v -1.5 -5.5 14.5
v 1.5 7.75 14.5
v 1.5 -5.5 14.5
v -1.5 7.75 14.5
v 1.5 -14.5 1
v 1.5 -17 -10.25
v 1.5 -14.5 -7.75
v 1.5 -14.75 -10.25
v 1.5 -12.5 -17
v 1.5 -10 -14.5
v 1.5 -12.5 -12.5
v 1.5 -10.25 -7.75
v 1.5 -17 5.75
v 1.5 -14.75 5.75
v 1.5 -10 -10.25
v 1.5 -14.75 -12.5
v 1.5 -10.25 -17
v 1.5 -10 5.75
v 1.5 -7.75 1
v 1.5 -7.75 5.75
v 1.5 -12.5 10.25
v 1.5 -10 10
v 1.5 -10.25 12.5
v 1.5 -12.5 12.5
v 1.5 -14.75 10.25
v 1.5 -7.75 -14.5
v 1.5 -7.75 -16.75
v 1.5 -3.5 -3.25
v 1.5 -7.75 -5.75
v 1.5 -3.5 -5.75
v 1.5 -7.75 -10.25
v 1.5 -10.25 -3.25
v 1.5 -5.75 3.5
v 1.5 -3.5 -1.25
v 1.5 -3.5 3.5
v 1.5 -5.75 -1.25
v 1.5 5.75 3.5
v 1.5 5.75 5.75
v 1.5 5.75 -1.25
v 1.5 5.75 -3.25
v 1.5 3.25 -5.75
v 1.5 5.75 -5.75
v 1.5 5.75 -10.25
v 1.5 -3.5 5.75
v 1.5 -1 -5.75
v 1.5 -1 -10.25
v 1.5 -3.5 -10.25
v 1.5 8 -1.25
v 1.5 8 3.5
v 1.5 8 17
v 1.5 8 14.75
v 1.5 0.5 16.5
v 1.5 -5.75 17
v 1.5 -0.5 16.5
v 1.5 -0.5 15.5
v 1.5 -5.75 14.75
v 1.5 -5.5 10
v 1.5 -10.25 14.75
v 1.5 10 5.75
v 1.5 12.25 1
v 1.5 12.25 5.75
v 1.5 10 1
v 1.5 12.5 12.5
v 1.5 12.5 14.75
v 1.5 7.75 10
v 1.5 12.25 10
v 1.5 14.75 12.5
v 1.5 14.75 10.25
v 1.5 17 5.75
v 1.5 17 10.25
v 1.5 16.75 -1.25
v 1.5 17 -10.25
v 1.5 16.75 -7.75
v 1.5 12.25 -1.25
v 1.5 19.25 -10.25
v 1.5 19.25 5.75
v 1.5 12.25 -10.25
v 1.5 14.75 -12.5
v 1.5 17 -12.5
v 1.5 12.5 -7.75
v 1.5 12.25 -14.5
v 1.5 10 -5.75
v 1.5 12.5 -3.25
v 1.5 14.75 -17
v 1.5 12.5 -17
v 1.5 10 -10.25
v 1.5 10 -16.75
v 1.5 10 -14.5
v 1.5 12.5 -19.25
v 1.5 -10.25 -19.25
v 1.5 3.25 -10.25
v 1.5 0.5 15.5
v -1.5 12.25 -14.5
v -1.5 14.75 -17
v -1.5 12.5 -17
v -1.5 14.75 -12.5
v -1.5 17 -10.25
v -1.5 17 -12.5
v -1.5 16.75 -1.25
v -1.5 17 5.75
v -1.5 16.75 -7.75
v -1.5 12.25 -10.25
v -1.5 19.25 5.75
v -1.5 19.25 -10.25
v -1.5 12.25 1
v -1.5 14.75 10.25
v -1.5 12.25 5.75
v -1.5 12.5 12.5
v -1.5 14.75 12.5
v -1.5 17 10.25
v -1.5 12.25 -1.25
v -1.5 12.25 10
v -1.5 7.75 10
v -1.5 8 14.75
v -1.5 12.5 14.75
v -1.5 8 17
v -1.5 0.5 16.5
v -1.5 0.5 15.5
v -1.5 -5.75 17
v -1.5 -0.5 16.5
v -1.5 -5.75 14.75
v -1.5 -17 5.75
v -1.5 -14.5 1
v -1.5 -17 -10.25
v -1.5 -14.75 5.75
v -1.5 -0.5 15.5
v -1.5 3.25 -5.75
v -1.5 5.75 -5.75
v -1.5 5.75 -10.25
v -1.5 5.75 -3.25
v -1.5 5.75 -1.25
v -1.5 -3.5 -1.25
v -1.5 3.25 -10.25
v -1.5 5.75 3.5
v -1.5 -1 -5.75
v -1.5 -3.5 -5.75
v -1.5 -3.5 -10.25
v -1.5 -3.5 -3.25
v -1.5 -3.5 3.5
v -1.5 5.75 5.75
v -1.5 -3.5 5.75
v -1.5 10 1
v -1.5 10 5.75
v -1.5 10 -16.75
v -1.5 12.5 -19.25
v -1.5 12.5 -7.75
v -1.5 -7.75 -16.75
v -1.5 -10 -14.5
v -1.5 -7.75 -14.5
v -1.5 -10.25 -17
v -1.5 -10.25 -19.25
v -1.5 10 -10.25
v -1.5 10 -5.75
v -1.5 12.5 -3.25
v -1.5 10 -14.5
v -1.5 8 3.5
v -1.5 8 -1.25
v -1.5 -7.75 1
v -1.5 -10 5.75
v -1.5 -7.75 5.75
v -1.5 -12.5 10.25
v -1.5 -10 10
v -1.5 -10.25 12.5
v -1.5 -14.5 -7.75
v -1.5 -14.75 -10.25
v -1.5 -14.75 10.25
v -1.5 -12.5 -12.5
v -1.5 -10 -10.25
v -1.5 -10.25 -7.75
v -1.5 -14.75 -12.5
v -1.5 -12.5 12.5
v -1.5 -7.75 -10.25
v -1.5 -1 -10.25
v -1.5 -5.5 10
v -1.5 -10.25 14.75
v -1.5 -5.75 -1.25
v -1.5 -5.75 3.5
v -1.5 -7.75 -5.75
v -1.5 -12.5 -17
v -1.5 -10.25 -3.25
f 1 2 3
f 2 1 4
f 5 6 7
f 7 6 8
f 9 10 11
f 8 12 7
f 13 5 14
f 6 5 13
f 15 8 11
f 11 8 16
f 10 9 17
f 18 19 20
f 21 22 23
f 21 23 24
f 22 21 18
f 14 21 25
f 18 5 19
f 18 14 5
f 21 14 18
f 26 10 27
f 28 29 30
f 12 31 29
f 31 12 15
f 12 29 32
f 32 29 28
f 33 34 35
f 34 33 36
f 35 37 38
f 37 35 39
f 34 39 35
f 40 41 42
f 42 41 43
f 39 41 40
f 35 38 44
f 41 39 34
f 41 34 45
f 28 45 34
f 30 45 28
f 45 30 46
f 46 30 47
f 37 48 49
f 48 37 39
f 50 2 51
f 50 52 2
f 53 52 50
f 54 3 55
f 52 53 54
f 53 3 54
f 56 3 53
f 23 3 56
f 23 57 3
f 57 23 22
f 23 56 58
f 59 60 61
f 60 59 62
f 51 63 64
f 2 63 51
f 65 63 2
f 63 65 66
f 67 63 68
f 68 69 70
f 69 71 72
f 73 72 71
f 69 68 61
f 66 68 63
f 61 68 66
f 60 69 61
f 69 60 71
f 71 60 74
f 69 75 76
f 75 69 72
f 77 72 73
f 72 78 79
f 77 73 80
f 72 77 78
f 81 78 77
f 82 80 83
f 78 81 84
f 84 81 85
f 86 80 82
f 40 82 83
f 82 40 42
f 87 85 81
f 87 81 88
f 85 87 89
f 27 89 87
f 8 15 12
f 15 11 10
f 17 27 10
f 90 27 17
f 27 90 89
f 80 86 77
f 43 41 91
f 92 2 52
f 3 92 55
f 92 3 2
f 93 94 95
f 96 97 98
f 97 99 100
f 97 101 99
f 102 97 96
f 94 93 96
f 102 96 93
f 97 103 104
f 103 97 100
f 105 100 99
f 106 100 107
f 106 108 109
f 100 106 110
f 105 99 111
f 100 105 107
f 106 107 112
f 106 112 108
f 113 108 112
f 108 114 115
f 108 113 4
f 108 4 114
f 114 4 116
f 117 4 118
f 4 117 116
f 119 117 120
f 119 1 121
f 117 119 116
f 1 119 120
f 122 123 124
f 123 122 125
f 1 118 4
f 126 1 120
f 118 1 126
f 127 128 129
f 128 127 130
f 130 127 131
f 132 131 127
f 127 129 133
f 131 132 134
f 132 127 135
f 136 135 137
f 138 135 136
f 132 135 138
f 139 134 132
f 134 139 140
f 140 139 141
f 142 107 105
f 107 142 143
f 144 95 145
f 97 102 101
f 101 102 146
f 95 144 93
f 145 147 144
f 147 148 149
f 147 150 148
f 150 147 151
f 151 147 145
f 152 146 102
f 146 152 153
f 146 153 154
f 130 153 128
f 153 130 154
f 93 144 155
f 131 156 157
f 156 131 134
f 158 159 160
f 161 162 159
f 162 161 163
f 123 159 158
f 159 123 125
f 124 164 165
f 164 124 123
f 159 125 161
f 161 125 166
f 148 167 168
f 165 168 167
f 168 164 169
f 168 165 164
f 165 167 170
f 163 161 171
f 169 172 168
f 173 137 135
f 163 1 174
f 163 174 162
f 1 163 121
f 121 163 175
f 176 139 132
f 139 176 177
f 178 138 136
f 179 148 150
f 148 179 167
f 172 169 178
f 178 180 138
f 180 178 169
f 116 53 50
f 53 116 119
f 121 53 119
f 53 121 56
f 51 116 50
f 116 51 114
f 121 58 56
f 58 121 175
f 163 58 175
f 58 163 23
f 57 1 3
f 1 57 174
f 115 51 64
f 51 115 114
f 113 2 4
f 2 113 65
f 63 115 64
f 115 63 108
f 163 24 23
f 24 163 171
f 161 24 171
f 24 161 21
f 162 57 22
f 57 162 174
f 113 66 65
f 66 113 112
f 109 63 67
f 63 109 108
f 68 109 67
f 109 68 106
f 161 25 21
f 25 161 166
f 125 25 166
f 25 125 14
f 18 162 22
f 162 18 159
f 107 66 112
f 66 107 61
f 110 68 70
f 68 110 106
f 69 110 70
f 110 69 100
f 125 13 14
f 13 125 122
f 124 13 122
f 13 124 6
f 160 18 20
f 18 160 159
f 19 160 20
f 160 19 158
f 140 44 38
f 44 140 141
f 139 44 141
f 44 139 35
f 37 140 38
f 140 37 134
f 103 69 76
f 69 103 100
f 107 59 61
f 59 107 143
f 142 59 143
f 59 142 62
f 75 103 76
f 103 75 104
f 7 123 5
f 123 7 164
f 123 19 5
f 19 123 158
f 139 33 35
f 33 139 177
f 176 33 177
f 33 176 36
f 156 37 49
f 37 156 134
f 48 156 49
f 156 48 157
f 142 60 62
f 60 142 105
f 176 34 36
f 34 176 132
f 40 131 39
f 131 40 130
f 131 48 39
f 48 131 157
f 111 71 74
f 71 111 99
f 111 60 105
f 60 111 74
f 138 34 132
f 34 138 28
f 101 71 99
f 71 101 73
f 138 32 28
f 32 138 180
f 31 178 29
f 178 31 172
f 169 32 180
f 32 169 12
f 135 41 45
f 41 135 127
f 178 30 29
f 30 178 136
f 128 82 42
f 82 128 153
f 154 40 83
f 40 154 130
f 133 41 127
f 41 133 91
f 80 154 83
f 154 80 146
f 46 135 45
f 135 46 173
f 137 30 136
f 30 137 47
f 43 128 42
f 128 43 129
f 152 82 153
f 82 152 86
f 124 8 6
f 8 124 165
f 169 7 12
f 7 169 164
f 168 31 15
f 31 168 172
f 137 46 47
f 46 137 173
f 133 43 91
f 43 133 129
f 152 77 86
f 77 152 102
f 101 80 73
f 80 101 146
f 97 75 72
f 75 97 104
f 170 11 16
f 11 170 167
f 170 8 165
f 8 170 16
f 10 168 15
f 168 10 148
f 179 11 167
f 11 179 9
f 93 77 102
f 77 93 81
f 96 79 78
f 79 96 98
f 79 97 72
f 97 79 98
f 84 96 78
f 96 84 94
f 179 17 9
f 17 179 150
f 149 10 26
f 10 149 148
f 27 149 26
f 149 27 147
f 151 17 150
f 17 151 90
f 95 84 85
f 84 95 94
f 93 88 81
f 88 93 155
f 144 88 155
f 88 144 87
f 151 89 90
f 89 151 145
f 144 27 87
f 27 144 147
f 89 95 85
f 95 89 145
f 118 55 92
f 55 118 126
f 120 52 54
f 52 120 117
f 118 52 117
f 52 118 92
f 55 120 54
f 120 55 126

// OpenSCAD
shape = 6;//[0:Custom,1:SpaceShip,2:Alien1,3:SpaceInvader,4:Heart,5:Bow,6:Mushroom,7:Skull,8:WaitCursor,9:Pacman1,10:Pacman2,11:Potion,12:QuestionMark]

Custom = "[[0,0,0]]";

//Size of the pixel art object
objectSize = 50; 
//Thickness of the pixel art object
objectThickness = 3; 

gridRows = 2*10; //can't find a better to to get the customizer to ignore it 

//Pixel Width
unitWidth = objectSize / gridRows;

holeSize = 1; //resize hole if you set it to 0 there will be no hole
holeLocation = 0; //Change this to move the hole up or down (positive = down, negative = up)
unitLength = unitWidth;
distance = unitWidth;

//Shapes

SpaceShip1 = [[-5,-3,0],[-5,3,0],[-4,-2,0],[-4,2,0],[-3,-1,0],[-3,0,0],[-3,1,0],[-2,-2,0],[-2,-1,0],[-2,0,0],[-2,1,0],[-2,2,0],[-1,-3,0],[-1,-2,0],[-1,-1,0],[-1,0,0],[-1,1,0],[-1,2,0],[-1,3,0],[0,-5,0],[0,-4,0],[0,-3,0],[0,-1,0],[0,1,0],[0,3,0],[0,4,0],[0,5,0],[1,-3,0],[1,-2,0],[1,-1,0],[1,0,0],[1,1,0],[1,2,0],[1,3,0],[2,-2,0],[2,-1,0],[2,0,0],[2,1,0],[2,2,0],[3,-1,0],[3,0,0],[3,1,0],[4,-2,0],[4,2,0],[5,-3,0],[5,3,0]];

Alien1 =[[-6,-2,0],[-6,-1,0],[-6,0,0],[-6,1,0],[-6,2,0],[-5,-2,0],[-5,0,0],[-5,2,0],[-4,-2,0],[-4,-1,0],[-4,0,0],[-4,1,0],[-4,2,0],[-3,0,0],[-2,-3,0],[-2,-2,0],[-2,-1,0],[-2,0,0],[-2,1,0],[-2,2,0],[-2,3,0],[-1,-4,0],[-1,-3,0],[-1,-1,0],[-1,0,0],[-1,1,0],[-1,3,0],[-1,4,0],[0,-4,0],[0,-1,0],[0,0,0],[0,1,0],[0,4,0],[1,-5,0],[1,-4,0],[1,-1,0],[1,0,0],[1,1,0],[1,4,0],[1,5,0],[2,-5,0],[2,-1,0],[2,0,0],[2,1,0],[2,5,0],[3,-1,0],[3,0,0],[3,1,0],[4,-3,0],[4,-2,0],[4,-1,0],[4,0,0],[4,1,0],[4,2,0],[4,3,0],[5,-3,0],[5,3,0],[6,-3,0],[6,3,0],[7,-5,0],[7,-4,0],[7,-3,0],[7,3,0],[7,4,0],[7,5,0]];

Alien2 = [[-4,-4,0],[-4,4,0],[-3,-3,0],[-3,3,0],[-2,-4,0],[-2,-3,0],[-2,-2,0],[-2,-1,0],[-2,0,0],[-2,1,0],[-2,2,0],[-2,3,0],[-2,4,0],[-1,-4,0],[-1,-1,0],[-1,0,0],[-1,1,0],[-1,4,0],[0,-4,0],[0,-1,0],[0,0,0],[0,1,0],[0,4,0],[1,-5,0],[1,-4,0],[1,-1,0],[1,0,0],[1,1,0],[1,4,0],[1,5,0],[2,-6,0],[2,-5,0],[2,-4,0],[2,-3,0],[2,-2,0],[2,-1,0],[2,0,0],[2,1,0],[2,2,0],[2,3,0],[2,4,0],[2,5,0],[2,6,0],[3,-7,0],[3,-6,0],[3,-5,0],[3,-4,0],[3,-3,0],[3,-2,0],[3,-1,0],[3,0,0],[3,1,0],[3,2,0],[3,3,0],[3,4,0],[3,5,0],[3,6,0],[3,7,0],[4,-7,0],[4,-4,0],[4,-3,0],[4,-2,0],[4,-1,0],[4,0,0],[4,1,0],[4,2,0],[4,3,0],[4,4,0],[4,7,0],[5,-7,0],[5,-4,0],[5,4,0],[5,7,0],[6,-3,0],[6,3,0],[7,-2,0],[7,-1,0],[7,1,0],[7,2,0]];


Heart = [[-2,-4,0],[-2,-3,0],[-2,-2,0],[-2,2,0],[-2,3,0],[-2,4,0],[-1,-5,0],[-1,-4,0],[-1,-2,0],[-1,-1,0],[-1,1,0],[-1,2,0],[-1,3,0],[-1,4,0],[-1,5,0],[0,-5,0],[0,-3,0],[0,-2,0],[0,-1,0],[0,0,0],[0,1,0],[0,2,0],[0,3,0],[0,4,0],[0,5,0],[1,-5,0],[1,-3,0],[1,-2,0],[1,-1,0],[1,0,0],[1,1,0],[1,2,0],[1,3,0],[1,4,0],[1,5,0],[2,-5,0],[2,-4,0],[2,-3,0],[2,-2,0],[2,-1,0],[2,0,0],[2,1,0],[2,2,0],[2,3,0],[2,4,0],[2,5,0],[3,-4,0],[3,-3,0],[3,-2,0],[3,-1,0],[3,0,0],[3,1,0],[3,2,0],[3,3,0],[3,4,0],[4,-3,0],[4,-2,0],[4,-1,0],[4,0,0],[4,1,0],[4,2,0],[4,3,0],[5,-2,0],[5,-1,0],[5,0,0],[5,1,0],[5,2,0],[6,-1,0],[6,0,0],[6,1,0],[7,0,0]];

Mushroom1 = [[-9,-2,0],[-9,-1,0],[-9,0,0],[-9,1,0],[-9,2,0],[-9,3,0],[-8,-4,0],[-8,-3,0],[-8,-2,0],[-8,-1,0],[-8,2,0],[-8,3,0],[-8,4,0],[-8,5,0],[-7,-5,0],[-7,-4,0],[-7,-3,0],[-7,-2,0],[-7,-1,0],[-7,2,0],[-7,3,0],[-7,4,0],[-7,5,0],[-7,6,0],[-6,-6,0],[-6,-5,0],[-6,-3,0],[-6,-2,0],[-6,3,0],[-6,4,0],[-6,6,0],[-6,7,0],[-5,-6,0],[-5,7,0],[-4,-7,0],[-4,-6,0],[-4,-5,0],[-4,6,0],[-4,7,0],[-4,8,0],[-3,-7,0],[-3,-6,0],[-3,-5,0],[-3,-4,0],[-3,5,0],[-3,6,0],[-3,7,0],[-3,8,0],[-2,-7,0],[-2,-6,0],[-2,-5,0],[-2,-4,0],[-2,-1,0],[-2,0,0],[-2,1,0],[-2,2,0],[-2,5,0],[-2,6,0],[-2,7,0],[-2,8,0],[-1,-7,0],[-1,-6,0],[-1,-5,0],[-1,-1,0],[-1,0,0],[-1,1,0],[-1,2,0],[-1,6,0],[-1,7,0],[-1,8,0],[0,-7,0],[0,-6,0],[0,-5,0],[0,-2,0],[0,-1,0],[0,0,0],[0,1,0],[0,2,0],[0,3,0],[0,6,0],[0,7,0],[0,8,0],[1,-7,0],[1,-1,0],[1,0,0],[1,1,0],[1,2,0],[1,8,0],[2,-7,0],[2,-4,0],[2,-3,0],[2,-2,0],[2,-1,0],[2,0,0],[2,1,0],[2,2,0],[2,3,0],[2,4,0],[2,5,0],[2,8,0],[3,-7,0],[3,-4,0],[3,-1,0],[3,2,0],[3,5,0],[3,8,0],[4,-7,0],[4,-6,0],[4,-5,0],[4,-1,0],[4,2,0],[4,6,0],[4,7,0],[4,8,0],[5,-6,0],[5,-5,0],[5,6,0],[5,7,0],[6,-5,0],[6,6,0],[7,-5,0],[7,-4,0],[7,5,0],[7,6,0],[8,-4,0],[8,-3,0],[8,-2,0],[8,-1,0],[8,0,0],[8,1,0],[8,2,0],[8,3,0],[8,4,0],[8,5,0]];;

Mushroom2 = [[-7,-2,0],[-7,-1,0],[-7,0,0],[-7,1,0],[-7,2,0],[-7,3,0],[-6,-4,0],[-6,-3,0],[-6,4,0],[-6,5,0],[-5,-5,0],[-5,-4,0],[-5,-3,0],[-5,4,0],[-5,5,0],[-5,6,0],[-4,-6,0],[-4,-5,0],[-4,6,0],[-4,7,0],[-3,-6,0],[-3,-5,0],[-3,6,0],[-3,7,0],[-2,-7,0],[-2,-6,0],[-2,-5,0],[-2,-4,0],[-2,-1,0],[-2,0,0],[-2,1,0],[-2,2,0],[-2,5,0],[-2,6,0],[-2,7,0],[-2,8,0],[-1,-7,0],[-1,-6,0],[-1,-5,0],[-1,-4,0],[-1,-2,0],[-1,-1,0],[-1,0,0],[-1,1,0],[-1,2,0],[-1,3,0],[-1,5,0],[-1,6,0],[-1,7,0],[-1,8,0],[0,-7,0],[0,-2,0],[0,-1,0],[0,0,0],[0,1,0],[0,2,0],[0,3,0],[0,6,0],[0,7,0],[0,8,0],[1,-7,0],[1,-1,0],[1,0,0],[1,1,0],[1,2,0],[1,8,0],[2,-7,0],[2,-4,0],[2,-3,0],[2,-2,0],[2,-1,0],[2,0,0],[2,1,0],[2,2,0],[2,3,0],[2,4,0],[2,5,0],[2,8,0],[3,-7,0],[3,-4,0],[3,-1,0],[3,2,0],[3,5,0],[3,8,0],[4,-7,0],[4,-6,0],[4,-5,0],[4,-4,0],[4,-1,0],[4,2,0],[4,5,0],[4,6,0],[4,7,0],[4,8,0],[5,-6,0],[5,-5,0],[5,6,0],[5,7,0],[6,-5,0],[6,6,0],[7,-5,0],[7,-4,0],[7,5,0],[7,6,0],[8,-4,0],[8,-3,0],[8,-2,0],[8,-1,0],[8,0,0],[8,1,0],[8,2,0],[8,3,0],[8,4,0],[8,5,0]];


Skull1=[[-4,-3,0],[-4,-2,0],[-4,-1,0],[-4,0,0],[-4,1,0],[-4,2,0],[-4,3,0],[-3,-4,0],[-3,-3,0],[-3,-2,0],[-3,-1,0],[-3,0,0],[-3,1,0],[-3,2,0],[-3,3,0],[-3,4,0],[-2,-5,0],[-2,-4,0],[-2,-3,0],[-2,-2,0],[-2,-1,0],[-2,0,0],[-2,1,0],[-2,2,0],[-2,3,0],[-2,4,0],[-2,5,0],[-1,-5,0],[-1,-4,0],[-1,0,0],[-1,4,0],[-1,5,0],[0,-5,0],[0,-4,0],[0,0,0],[0,4,0],[0,5,0],[1,-5,0],[1,-4,0],[1,0,0],[1,4,0],[1,5,0],[2,-5,0],[2,-4,0],[2,-3,0],[2,-2,0],[2,-1,0],[2,0,0],[2,1,0],[2,2,0],[2,3,0],[2,4,0],[2,5,0],[3,-4,0],[3,-3,0],[3,-1,0],[3,1,0],[3,3,0],[3,4,0],[4,-3,0],[4,-1,0],[4,1,0],[4,3,0],[5,-3,0],[5,-1,0],[5,1,0],[5,3,0],[6,-3,0],[6,-1,0],[6,1,0],[6,3,0],[7,-3,0],[7,-2,0],[7,-1,0],[7,0,0],[7,1,0],[7,2,0],[7,3,0]];


Wait1= [[-10,-5,0],[-10,-4,0],[-10,-3,0],[-10,-2,0],[-10,-1,0],[-10,0,0],[-10,1,0],[-10,2,0],[-10,3,0],[-10,4,0],[-10,5,0],[-9,-5,0],[-9,5,0],[-8,-5,0],[-8,-4,0],[-8,-3,0],[-8,-2,0],[-8,-1,0],[-8,0,0],[-8,1,0],[-8,2,0],[-8,3,0],[-8,4,0],[-8,5,0],[-7,-4,0],[-7,4,0],[-6,-4,0],[-6,-2,0],[-6,0,0],[-6,2,0],[-6,4,0],[-5,-4,0],[-5,-1,0],[-5,1,0],[-5,4,0],[-4,-4,0],[-4,0,0],[-4,4,0],[-3,-4,0],[-3,4,0],[-2,-3,0],[-2,-2,0],[-2,0,0],[-2,2,0],[-2,3,0],[-1,-2,0],[-1,-1,0],[-1,1,0],[-1,2,0],[0,-1,0],[0,1,0],[1,-2,0],[1,-1,0],[1,1,0],[1,2,0],[2,-3,0],[2,-2,0],[2,0,0],[2,2,0],[2,3,0],[3,-4,0],[3,4,0],[4,-4,0],[4,0,0],[4,4,0],[5,-4,0],[5,-1,0],[5,1,0],[5,4,0],[6,-4,0],[6,-2,0],[6,0,0],[6,2,0],[6,4,0],[7,-5,0],[7,-4,0],[7,-3,0],[7,-2,0],[7,-1,0],[7,0,0],[7,1,0],[7,2,0],[7,3,0],[7,4,0],[7,5,0],[8,-5,0],[8,5,0],[9,-5,0],[9,-4,0],[9,-3,0],[9,-2,0],[9,-1,0],[9,0,0],[9,1,0],[9,2,0],[9,3,0],[9,4,0],[9,5,0]];

Pacman1 =[[-6,-2,0],[-6,-1,0],[-6,0,0],[-6,1,0],[-6,2,0],[-5,-4,0],[-5,-3,0],[-5,-2,0],[-5,-1,0],[-5,0,0],[-5,1,0],[-5,2,0],[-5,3,0],[-5,4,0],[-4,-5,0],[-4,-4,0],[-4,-3,0],[-4,-2,0],[-4,-1,0],[-4,0,0],[-4,1,0],[-4,2,0],[-4,3,0],[-4,4,0],[-4,5,0],[-3,-5,0],[-3,-4,0],[-3,-3,0],[-3,-2,0],[-3,-1,0],[-3,0,0],[-3,1,0],[-3,2,0],[-3,3,0],[-3,4,0],[-3,5,0],[-2,-6,0],[-2,-5,0],[-2,-4,0],[-2,-3,0],[-2,-2,0],[-2,-1,0],[-2,0,0],[-2,1,0],[-2,2,0],[-2,3,0],[-1,-6,0],[-1,-5,0],[-1,-4,0],[-1,-3,0],[-1,-2,0],[-1,-1,0],[-1,0,0],[0,-6,0],[0,-5,0],[0,-4,0],[0,-3,0],[0,-2,0],[1,-6,0],[1,-5,0],[1,-4,0],[1,-3,0],[1,-2,0],[1,-1,0],[1,0,0],[2,-6,0],[2,-5,0],[2,-4,0],[2,-3,0],[2,-2,0],[2,-1,0],[2,0,0],[2,1,0],[2,2,0],[2,3,0],[3,-5,0],[3,-4,0],[3,-3,0],[3,-2,0],[3,-1,0],[3,0,0],[3,1,0],[3,2,0],[3,3,0],[3,4,0],[3,5,0],[4,-5,0],[4,-4,0],[4,-3,0],[4,-2,0],[4,-1,0],[4,0,0],[4,1,0],[4,2,0],[4,3,0],[4,4,0],[4,5,0],[5,-4,0],[5,-3,0],[5,-2,0],[5,-1,0],[5,0,0],[5,1,0],[5,2,0],[5,3,0],[5,4,0],[6,-2,0],[6,-1,0],[6,0,0],[6,1,0],[6,2,0]];

Pacman2 = [[-10,-3,0],[-10,-2,0],[-10,-1,0],[-10,0,0],[-10,1,0],[-10,2,0],[-10,3,0],[-9,-6,0],[-9,-5,0],[-9,-4,0],[-9,-3,0],[-9,-2,0],[-9,-1,0],[-9,0,0],[-9,1,0],[-9,2,0],[-9,3,0],[-9,4,0],[-9,5,0],[-9,6,0],[-8,-6,0],[-8,-5,0],[-8,-4,0],[-8,-3,0],[-8,-2,0],[-8,-1,0],[-8,0,0],[-8,1,0],[-8,2,0],[-8,3,0],[-8,4,0],[-8,5,0],[-8,6,0],[-7,-7,0],[-7,-6,0],[-7,-5,0],[-7,-4,0],[-7,-3,0],[-7,-2,0],[-7,-1,0],[-7,0,0],[-7,1,0],[-7,2,0],[-7,3,0],[-7,4,0],[-7,5,0],[-7,6,0],[-7,7,0],[-6,-8,0],[-6,-7,0],[-6,-6,0],[-6,-5,0],[-6,-4,0],[-6,-3,0],[-6,-2,0],[-6,-1,0],[-6,0,0],[-6,1,0],[-6,2,0],[-6,3,0],[-6,4,0],[-6,5,0],[-6,6,0],[-6,7,0],[-6,8,0],[-5,-8,0],[-5,-7,0],[-5,-6,0],[-5,-5,0],[-5,-4,0],[-5,-3,0],[-5,-2,0],[-5,-1,0],[-5,0,0],[-5,1,0],[-5,2,0],[-5,3,0],[-5,4,0],[-5,5,0],[-5,6,0],[-5,7,0],[-5,8,0],[-4,-8,0],[-4,-7,0],[-4,-6,0],[-4,-2,0],[-4,-1,0],[-4,0,0],[-4,1,0],[-4,2,0],[-4,6,0],[-4,7,0],[-4,8,0],[-3,-9,0],[-3,-8,0],[-3,-7,0],[-3,-1,0],[-3,0,0],[-3,1,0],[-3,7,0],[-3,8,0],[-2,-9,0],[-2,-8,0],[-2,-7,0],[-2,-1,0],[-2,0,0],[-2,1,0],[-2,7,0],[-2,8,0],[-2,9,0],[-1,-9,0],[-1,-8,0],[-1,-7,0],[-1,-5,0],[-1,-4,0],[-1,-3,0],[-1,-1,0],[-1,0,0],[-1,1,0],[-1,3,0],[-1,4,0],[-1,5,0],[-1,7,0],[-1,8,0],[-1,9,0],[0,-9,0],[0,-8,0],[0,-7,0],[0,-5,0],[0,-4,0],[0,-3,0],[0,-1,0],[0,0,0],[0,1,0],[0,3,0],[0,4,0],[0,5,0],[0,7,0],[0,8,0],[0,9,0],[1,-9,0],[1,-8,0],[1,-7,0],[1,-5,0],[1,-4,0],[1,-3,0],[1,-1,0],[1,0,0],[1,1,0],[1,3,0],[1,4,0],[1,5,0],[1,7,0],[1,8,0],[1,9,0],[2,-9,0],[2,-8,0],[2,-7,0],[2,-6,0],[2,-5,0],[2,-4,0],[2,-3,0],[2,-2,0],[2,-1,0],[2,0,0],[2,1,0],[2,2,0],[2,3,0],[2,4,0],[2,5,0],[2,6,0],[2,7,0],[2,8,0],[2,9,0],[3,-9,0],[3,-8,0],[3,-7,0],[3,-6,0],[3,-5,0],[3,-4,0],[3,-3,0],[3,-2,0],[3,-1,0],[3,0,0],[3,1,0],[3,2,0],[3,3,0],[3,4,0],[3,5,0],[3,6,0],[3,7,0],[3,8,0],[3,9,0],[4,-9,0],[4,-8,0],[4,-7,0],[4,-6,0],[4,-5,0],[4,-4,0],[4,-3,0],[4,-2,0],[4,-1,0],[4,0,0],[4,1,0],[4,2,0],[4,3,0],[4,4,0],[4,5,0],[4,6,0],[4,7,0],[4,8,0],[4,9,0],[5,-9,0],[5,-8,0],[5,-7,0],[5,-6,0],[5,-5,0],[5,-4,0],[5,-3,0],[5,-2,0],[5,-1,0],[5,0,0],[5,1,0],[5,2,0],[5,3,0],[5,4,0],[5,5,0],[5,6,0],[5,7,0],[5,8,0],[5,9,0],[6,-9,0],[6,-8,0],[6,-7,0],[6,-6,0],[6,-5,0],[6,-4,0],[6,-3,0],[6,-2,0],[6,-1,0],[6,0,0],[6,1,0],[6,2,0],[6,3,0],[6,4,0],[6,5,0],[6,6,0],[6,7,0],[6,8,0],[6,9,0],[7,-9,0],[7,-8,0],[7,-7,0],[7,-6,0],[7,-5,0],[7,-4,0],[7,-3,0],[7,-2,0],[7,-1,0],[7,0,0],[7,1,0],[7,2,0],[7,3,0],[7,4,0],[7,5,0],[7,6,0],[7,7,0],[7,8,0],[7,9,0],[8,-9,0],[8,-8,0],[8,-7,0],[8,-6,0],[8,-5,0],[8,-2,0],[8,-1,0],[8,0,0],[8,1,0],[8,2,0],[8,5,0],[8,6,0],[8,7,0],[8,8,0],[8,9,0],[9,-8,0],[9,-7,0],[9,-6,0],[9,0,0],[9,6,0],[9,7,0],[9,8,0]];

Bow1 = [[-5,-7,0],[-5,-6,0],[-5,6,0],[-5,7,0],[-4,-8,0],[-4,-5,0],[-4,-4,0],[-4,4,0],[-4,5,0],[-4,8,0],[-3,-8,0],[-3,-3,0],[-3,3,0],[-3,8,0],[-2,-9,0],[-2,-2,0],[-2,-1,0],[-2,0,0],[-2,1,0],[-2,2,0],[-2,9,0],[-1,-9,0],[-1,-4,0],[-1,-2,0],[-1,-1,0],[-1,0,0],[-1,1,0],[-1,2,0],[-1,4,0],[-1,9,0],[0,-9,0],[0,-3,0],[0,-2,0],[0,-1,0],[0,0,0],[0,1,0],[0,2,0],[0,3,0],[0,9,0],[1,-9,0],[1,-4,0],[1,-2,0],[1,-1,0],[1,0,0],[1,1,0],[1,2,0],[1,4,0],[1,9,0],[2,-9,0],[2,-2,0],[2,-1,0],[2,0,0],[2,1,0],[2,2,0],[2,9,0],[3,-8,0],[3,-3,0],[3,3,0],[3,8,0],[4,-8,0],[4,-5,0],[4,-4,0],[4,4,0],[4,5,0],[4,8,0],[5,-7,0],[5,-6,0],[5,6,0],[5,7,0]];;

Potion = [[-10,-3,0],[-10,-2,0],[-10,-1,0],[-10,0,0],[-10,1,0],[-10,2,0],[-10,3,0],[-9,-3,0],[-9,3,0],[-8,-2,0],[-8,2,0],[-7,-2,0],[-7,2,0],[-6,-2,0],[-6,2,0],[-5,-3,0],[-5,3,0],[-4,-3,0],[-4,2,0],[-4,3,0],[-3,-4,0],[-3,-2,0],[-3,3,0],[-3,4,0],[-2,-4,0],[-2,1,0],[-2,4,0],[-1,-5,0],[-1,2,0],[-1,3,0],[-1,4,0],[-1,5,0],[0,-5,0],[0,-1,0],[0,0,0],[0,1,0],[0,2,0],[0,3,0],[0,4,0],[0,5,0],[1,-6,0],[1,-5,0],[1,-4,0],[1,-3,0],[1,-2,0],[1,-1,0],[1,0,0],[1,1,0],[1,2,0],[1,3,0],[1,4,0],[1,5,0],[1,6,0],[2,-6,0],[2,-5,0],[2,-4,0],[2,-3,0],[2,-2,0],[2,-1,0],[2,0,0],[2,1,0],[2,2,0],[2,3,0],[2,4,0],[2,5,0],[2,6,0],[3,-7,0],[3,-6,0],[3,-5,0],[3,-4,0],[3,-3,0],[3,-2,0],[3,-1,0],[3,0,0],[3,1,0],[3,2,0],[3,3,0],[3,4,0],[3,5,0],[3,6,0],[3,7,0],[4,-7,0],[4,-6,0],[4,-5,0],[4,-4,0],[4,-3,0],[4,-2,0],[4,-1,0],[4,0,0],[4,1,0],[4,2,0],[4,3,0],[4,4,0],[4,5,0],[4,6,0],[4,7,0],[5,-8,0],[5,-7,0],[5,-6,0],[5,-5,0],[5,-4,0],[5,-3,0],[5,-2,0],[5,-1,0],[5,0,0],[5,1,0],[5,2,0],[5,3,0],[5,4,0],[5,5,0],[5,6,0],[5,7,0],[5,8,0],[6,-8,0],[6,-7,0],[6,-6,0],[6,-5,0],[6,-4,0],[6,-3,0],[6,-2,0],[6,-1,0],[6,0,0],[6,1,0],[6,2,0],[6,3,0],[6,4,0],[6,5,0],[6,6,0],[6,7,0],[6,8,0],[7,-9,0],[7,-8,0],[7,-7,0],[7,-6,0],[7,-5,0],[7,-4,0],[7,-3,0],[7,-2,0],[7,-1,0],[7,0,0],[7,1,0],[7,2,0],[7,3,0],[7,4,0],[7,5,0],[7,6,0],[7,7,0],[7,8,0],[7,9,0],[8,-9,0],[8,-8,0],[8,-7,0],[8,-6,0],[8,-5,0],[8,-4,0],[8,-3,0],[8,-2,0],[8,-1,0],[8,0,0],[8,1,0],[8,2,0],[8,3,0],[8,4,0],[8,5,0],[8,6,0],[8,7,0],[8,8,0],[8,9,0],[9,-8,0],[9,-7,0],[9,-6,0],[9,-5,0],[9,-4,0],[9,-3,0],[9,-2,0],[9,-1,0],[9,0,0],[9,1,0],[9,2,0],[9,3,0],[9,4,0],[9,5,0],[9,6,0],[9,7,0],[9,8,0]];


QuestionMark = [[-8,-9,0],[-8,-8,0],[-8,-7,0],[-8,-6,0],[-8,-5,0],[-8,-4,0],[-8,-3,0],[-8,-2,0],[-8,-1,0],[-8,0,0],[-8,1,0],[-8,2,0],[-8,3,0],[-8,4,0],[-8,5,0],[-8,6,0],[-8,7,0],[-8,8,0],[-7,-9,0],[-7,-7,0],[-7,-6,0],[-7,-5,0],[-7,-4,0],[-7,-3,0],[-7,-2,0],[-7,-1,0],[-7,0,0],[-7,1,0],[-7,2,0],[-7,3,0],[-7,4,0],[-7,5,0],[-7,6,0],[-7,8,0],[-6,-9,0],[-6,-8,0],[-6,-7,0],[-6,-6,0],[-6,-5,0],[-6,-4,0],[-6,-3,0],[-6,-2,0],[-6,-1,0],[-6,0,0],[-6,1,0],[-6,2,0],[-6,3,0],[-6,4,0],[-6,5,0],[-6,6,0],[-6,7,0],[-6,8,0],[-5,-9,0],[-5,-8,0],[-5,-7,0],[-5,-6,0],[-5,-5,0],[-5,-4,0],[-5,-3,0],[-5,-2,0],[-5,-1,0],[-5,0,0],[-5,1,0],[-5,2,0],[-5,3,0],[-5,4,0],[-5,5,0],[-5,6,0],[-5,7,0],[-5,8,0],[-4,-9,0],[-4,-8,0],[-4,-7,0],[-4,-6,0],[-4,-5,0],[-4,-4,0],[-4,3,0],[-4,4,0],[-4,5,0],[-4,6,0],[-4,7,0],[-4,8,0],[-3,-9,0],[-3,-8,0],[-3,-7,0],[-3,-6,0],[-3,-5,0],[-3,-2,0],[-3,-1,0],[-3,0,0],[-3,1,0],[-3,4,0],[-3,5,0],[-3,6,0],[-3,7,0],[-3,8,0],[-2,-9,0],[-2,-8,0],[-2,-7,0],[-2,-6,0],[-2,-5,0],[-2,-2,0],[-2,-1,0],[-2,0,0],[-2,1,0],[-2,4,0],[-2,5,0],[-2,6,0],[-2,7,0],[-2,8,0],[-1,-9,0],[-1,-8,0],[-1,-7,0],[-1,-6,0],[-1,-5,0],[-1,-2,0],[-1,-1,0],[-1,0,0],[-1,1,0],[-1,4,0],[-1,5,0],[-1,6,0],[-1,7,0],[-1,8,0],[0,-9,0],[0,-8,0],[0,-7,0],[0,-6,0],[0,-5,0],[0,-2,0],[0,-1,0],[0,0,0],[0,1,0],[0,4,0],[0,5,0],[0,6,0],[0,7,0],[0,8,0],[1,-9,0],[1,-8,0],[1,-7,0],[1,-6,0],[1,-5,0],[1,-4,0],[1,-3,0],[1,-2,0],[1,-1,0],[1,0,0],[1,4,0],[1,5,0],[1,6,0],[1,7,0],[1,8,0],[2,-9,0],[2,-8,0],[2,-7,0],[2,-6,0],[2,-5,0],[2,-4,0],[2,-3,0],[2,-2,0],[2,-1,0],[2,0,0],[2,2,0],[2,3,0],[2,4,0],[2,5,0],[2,6,0],[2,7,0],[2,8,0],[3,-9,0],[3,-8,0],[3,-7,0],[3,-6,0],[3,-5,0],[3,-4,0],[3,-3,0],[3,-2,0],[3,-1,0],[3,2,0],[3,3,0],[3,4,0],[3,5,0],[3,6,0],[3,7,0],[3,8,0],[4,-9,0],[4,-8,0],[4,-7,0],[4,-6,0],[4,-5,0],[4,-4,0],[4,-3,0],[4,-2,0],[4,-1,0],[4,2,0],[4,3,0],[4,4,0],[4,5,0],[4,6,0],[4,7,0],[4,8,0],[5,-9,0],[5,-8,0],[5,-7,0],[5,-6,0],[5,-5,0],[5,-4,0],[5,-3,0],[5,-2,0],[5,-1,0],[5,0,0],[5,1,0],[5,2,0],[5,3,0],[5,4,0],[5,5,0],[5,6,0],[5,7,0],[5,8,0],[6,-9,0],[6,-8,0],[6,-7,0],[6,-6,0],[6,-5,0],[6,-4,0],[6,-3,0],[6,-2,0],[6,-1,0],[6,2,0],[6,3,0],[6,4,0],[6,5,0],[6,6,0],[6,7,0],[6,8,0],[7,-9,0],[7,-8,0],[7,-7,0],[7,-6,0],[7,-5,0],[7,-4,0],[7,-3,0],[7,-2,0],[7,-1,0],[7,2,0],[7,3,0],[7,4,0],[7,5,0],[7,6,0],[7,7,0],[7,8,0],[8,-9,0],[8,-7,0],[8,-6,0],[8,-5,0],[8,-4,0],[8,-3,0],[8,-2,0],[8,-1,0],[8,0,0],[8,1,0],[8,2,0],[8,3,0],[8,4,0],[8,5,0],[8,6,0],[8,8,0],[9,-9,0],[9,-8,0],[9,-7,0],[9,-6,0],[9,-5,0],[9,-4,0],[9,-3,0],[9,-2,0],[9,-1,0],[9,0,0],[9,1,0],[9,2,0],[9,3,0],[9,4,0],[9,5,0],[9,6,0],[9,7,0],[9,8,0]];
//You can enter you own shape array here:



//Draw the shape we chose
if (shape == 1)
{
	pixel(SpaceShip1, -6);
}
else if (shape == 2)
{ 
	color("Blue")
	pixel(Alien1, -14);
}
else if (shape == 3)
{
	color("Blue")
	pixel(Alien2, -4.5);
}
else if(shape == 4)
{
	color("red")
	pixel(Heart, 0);
}

else if (shape == 5)
{
	color("red")
	pixel(Bow1, -4);
}

else if (shape == 6)
{
	color("green")
	pixel(Mushroom2, -16);
}

else if (shape == 7)
{
	color("black")
	pixel(Skull1, -8);
}

else if(shape == 8)
{
	color("black")
	pixel(Wait1, -22.5);
}
else if(shape == 9)
{
	pixel(Pacman1, -13);
}
else if(shape == 10)
{
	color("red")
	pixel(Pacman2, -22);
}
else if(shape == 11)
{
	color("blue")
	pixel(Potion, -22.5);
}
else if(shape == 12)
{
	color("green")
	pixel(QuestionMark, -17);
}
else if(shape == 0)
{
	color("red")
	pixel(Custom, -5);
}


//Draw the pixel shape
module pixel(num, holeHight)
{
	rotate(a=[0,90,0])
	{
		difference()
		{
				union()
				{
	 					for(i = num)
    					{
     					translate(i*distance*0.9) //the 0.9 guarantees some overlap
     					cube([unitLength, unitWidth, objectThickness], center = true);  
    					}
				}
		
				translate([holeHight + holeLocation,0,0])
				{
					rotate(a=[0,0,0])
					{
						cube([holeSize, holeSize, objectThickness * 2], center = true);
					}
				}
		}
	}
}


